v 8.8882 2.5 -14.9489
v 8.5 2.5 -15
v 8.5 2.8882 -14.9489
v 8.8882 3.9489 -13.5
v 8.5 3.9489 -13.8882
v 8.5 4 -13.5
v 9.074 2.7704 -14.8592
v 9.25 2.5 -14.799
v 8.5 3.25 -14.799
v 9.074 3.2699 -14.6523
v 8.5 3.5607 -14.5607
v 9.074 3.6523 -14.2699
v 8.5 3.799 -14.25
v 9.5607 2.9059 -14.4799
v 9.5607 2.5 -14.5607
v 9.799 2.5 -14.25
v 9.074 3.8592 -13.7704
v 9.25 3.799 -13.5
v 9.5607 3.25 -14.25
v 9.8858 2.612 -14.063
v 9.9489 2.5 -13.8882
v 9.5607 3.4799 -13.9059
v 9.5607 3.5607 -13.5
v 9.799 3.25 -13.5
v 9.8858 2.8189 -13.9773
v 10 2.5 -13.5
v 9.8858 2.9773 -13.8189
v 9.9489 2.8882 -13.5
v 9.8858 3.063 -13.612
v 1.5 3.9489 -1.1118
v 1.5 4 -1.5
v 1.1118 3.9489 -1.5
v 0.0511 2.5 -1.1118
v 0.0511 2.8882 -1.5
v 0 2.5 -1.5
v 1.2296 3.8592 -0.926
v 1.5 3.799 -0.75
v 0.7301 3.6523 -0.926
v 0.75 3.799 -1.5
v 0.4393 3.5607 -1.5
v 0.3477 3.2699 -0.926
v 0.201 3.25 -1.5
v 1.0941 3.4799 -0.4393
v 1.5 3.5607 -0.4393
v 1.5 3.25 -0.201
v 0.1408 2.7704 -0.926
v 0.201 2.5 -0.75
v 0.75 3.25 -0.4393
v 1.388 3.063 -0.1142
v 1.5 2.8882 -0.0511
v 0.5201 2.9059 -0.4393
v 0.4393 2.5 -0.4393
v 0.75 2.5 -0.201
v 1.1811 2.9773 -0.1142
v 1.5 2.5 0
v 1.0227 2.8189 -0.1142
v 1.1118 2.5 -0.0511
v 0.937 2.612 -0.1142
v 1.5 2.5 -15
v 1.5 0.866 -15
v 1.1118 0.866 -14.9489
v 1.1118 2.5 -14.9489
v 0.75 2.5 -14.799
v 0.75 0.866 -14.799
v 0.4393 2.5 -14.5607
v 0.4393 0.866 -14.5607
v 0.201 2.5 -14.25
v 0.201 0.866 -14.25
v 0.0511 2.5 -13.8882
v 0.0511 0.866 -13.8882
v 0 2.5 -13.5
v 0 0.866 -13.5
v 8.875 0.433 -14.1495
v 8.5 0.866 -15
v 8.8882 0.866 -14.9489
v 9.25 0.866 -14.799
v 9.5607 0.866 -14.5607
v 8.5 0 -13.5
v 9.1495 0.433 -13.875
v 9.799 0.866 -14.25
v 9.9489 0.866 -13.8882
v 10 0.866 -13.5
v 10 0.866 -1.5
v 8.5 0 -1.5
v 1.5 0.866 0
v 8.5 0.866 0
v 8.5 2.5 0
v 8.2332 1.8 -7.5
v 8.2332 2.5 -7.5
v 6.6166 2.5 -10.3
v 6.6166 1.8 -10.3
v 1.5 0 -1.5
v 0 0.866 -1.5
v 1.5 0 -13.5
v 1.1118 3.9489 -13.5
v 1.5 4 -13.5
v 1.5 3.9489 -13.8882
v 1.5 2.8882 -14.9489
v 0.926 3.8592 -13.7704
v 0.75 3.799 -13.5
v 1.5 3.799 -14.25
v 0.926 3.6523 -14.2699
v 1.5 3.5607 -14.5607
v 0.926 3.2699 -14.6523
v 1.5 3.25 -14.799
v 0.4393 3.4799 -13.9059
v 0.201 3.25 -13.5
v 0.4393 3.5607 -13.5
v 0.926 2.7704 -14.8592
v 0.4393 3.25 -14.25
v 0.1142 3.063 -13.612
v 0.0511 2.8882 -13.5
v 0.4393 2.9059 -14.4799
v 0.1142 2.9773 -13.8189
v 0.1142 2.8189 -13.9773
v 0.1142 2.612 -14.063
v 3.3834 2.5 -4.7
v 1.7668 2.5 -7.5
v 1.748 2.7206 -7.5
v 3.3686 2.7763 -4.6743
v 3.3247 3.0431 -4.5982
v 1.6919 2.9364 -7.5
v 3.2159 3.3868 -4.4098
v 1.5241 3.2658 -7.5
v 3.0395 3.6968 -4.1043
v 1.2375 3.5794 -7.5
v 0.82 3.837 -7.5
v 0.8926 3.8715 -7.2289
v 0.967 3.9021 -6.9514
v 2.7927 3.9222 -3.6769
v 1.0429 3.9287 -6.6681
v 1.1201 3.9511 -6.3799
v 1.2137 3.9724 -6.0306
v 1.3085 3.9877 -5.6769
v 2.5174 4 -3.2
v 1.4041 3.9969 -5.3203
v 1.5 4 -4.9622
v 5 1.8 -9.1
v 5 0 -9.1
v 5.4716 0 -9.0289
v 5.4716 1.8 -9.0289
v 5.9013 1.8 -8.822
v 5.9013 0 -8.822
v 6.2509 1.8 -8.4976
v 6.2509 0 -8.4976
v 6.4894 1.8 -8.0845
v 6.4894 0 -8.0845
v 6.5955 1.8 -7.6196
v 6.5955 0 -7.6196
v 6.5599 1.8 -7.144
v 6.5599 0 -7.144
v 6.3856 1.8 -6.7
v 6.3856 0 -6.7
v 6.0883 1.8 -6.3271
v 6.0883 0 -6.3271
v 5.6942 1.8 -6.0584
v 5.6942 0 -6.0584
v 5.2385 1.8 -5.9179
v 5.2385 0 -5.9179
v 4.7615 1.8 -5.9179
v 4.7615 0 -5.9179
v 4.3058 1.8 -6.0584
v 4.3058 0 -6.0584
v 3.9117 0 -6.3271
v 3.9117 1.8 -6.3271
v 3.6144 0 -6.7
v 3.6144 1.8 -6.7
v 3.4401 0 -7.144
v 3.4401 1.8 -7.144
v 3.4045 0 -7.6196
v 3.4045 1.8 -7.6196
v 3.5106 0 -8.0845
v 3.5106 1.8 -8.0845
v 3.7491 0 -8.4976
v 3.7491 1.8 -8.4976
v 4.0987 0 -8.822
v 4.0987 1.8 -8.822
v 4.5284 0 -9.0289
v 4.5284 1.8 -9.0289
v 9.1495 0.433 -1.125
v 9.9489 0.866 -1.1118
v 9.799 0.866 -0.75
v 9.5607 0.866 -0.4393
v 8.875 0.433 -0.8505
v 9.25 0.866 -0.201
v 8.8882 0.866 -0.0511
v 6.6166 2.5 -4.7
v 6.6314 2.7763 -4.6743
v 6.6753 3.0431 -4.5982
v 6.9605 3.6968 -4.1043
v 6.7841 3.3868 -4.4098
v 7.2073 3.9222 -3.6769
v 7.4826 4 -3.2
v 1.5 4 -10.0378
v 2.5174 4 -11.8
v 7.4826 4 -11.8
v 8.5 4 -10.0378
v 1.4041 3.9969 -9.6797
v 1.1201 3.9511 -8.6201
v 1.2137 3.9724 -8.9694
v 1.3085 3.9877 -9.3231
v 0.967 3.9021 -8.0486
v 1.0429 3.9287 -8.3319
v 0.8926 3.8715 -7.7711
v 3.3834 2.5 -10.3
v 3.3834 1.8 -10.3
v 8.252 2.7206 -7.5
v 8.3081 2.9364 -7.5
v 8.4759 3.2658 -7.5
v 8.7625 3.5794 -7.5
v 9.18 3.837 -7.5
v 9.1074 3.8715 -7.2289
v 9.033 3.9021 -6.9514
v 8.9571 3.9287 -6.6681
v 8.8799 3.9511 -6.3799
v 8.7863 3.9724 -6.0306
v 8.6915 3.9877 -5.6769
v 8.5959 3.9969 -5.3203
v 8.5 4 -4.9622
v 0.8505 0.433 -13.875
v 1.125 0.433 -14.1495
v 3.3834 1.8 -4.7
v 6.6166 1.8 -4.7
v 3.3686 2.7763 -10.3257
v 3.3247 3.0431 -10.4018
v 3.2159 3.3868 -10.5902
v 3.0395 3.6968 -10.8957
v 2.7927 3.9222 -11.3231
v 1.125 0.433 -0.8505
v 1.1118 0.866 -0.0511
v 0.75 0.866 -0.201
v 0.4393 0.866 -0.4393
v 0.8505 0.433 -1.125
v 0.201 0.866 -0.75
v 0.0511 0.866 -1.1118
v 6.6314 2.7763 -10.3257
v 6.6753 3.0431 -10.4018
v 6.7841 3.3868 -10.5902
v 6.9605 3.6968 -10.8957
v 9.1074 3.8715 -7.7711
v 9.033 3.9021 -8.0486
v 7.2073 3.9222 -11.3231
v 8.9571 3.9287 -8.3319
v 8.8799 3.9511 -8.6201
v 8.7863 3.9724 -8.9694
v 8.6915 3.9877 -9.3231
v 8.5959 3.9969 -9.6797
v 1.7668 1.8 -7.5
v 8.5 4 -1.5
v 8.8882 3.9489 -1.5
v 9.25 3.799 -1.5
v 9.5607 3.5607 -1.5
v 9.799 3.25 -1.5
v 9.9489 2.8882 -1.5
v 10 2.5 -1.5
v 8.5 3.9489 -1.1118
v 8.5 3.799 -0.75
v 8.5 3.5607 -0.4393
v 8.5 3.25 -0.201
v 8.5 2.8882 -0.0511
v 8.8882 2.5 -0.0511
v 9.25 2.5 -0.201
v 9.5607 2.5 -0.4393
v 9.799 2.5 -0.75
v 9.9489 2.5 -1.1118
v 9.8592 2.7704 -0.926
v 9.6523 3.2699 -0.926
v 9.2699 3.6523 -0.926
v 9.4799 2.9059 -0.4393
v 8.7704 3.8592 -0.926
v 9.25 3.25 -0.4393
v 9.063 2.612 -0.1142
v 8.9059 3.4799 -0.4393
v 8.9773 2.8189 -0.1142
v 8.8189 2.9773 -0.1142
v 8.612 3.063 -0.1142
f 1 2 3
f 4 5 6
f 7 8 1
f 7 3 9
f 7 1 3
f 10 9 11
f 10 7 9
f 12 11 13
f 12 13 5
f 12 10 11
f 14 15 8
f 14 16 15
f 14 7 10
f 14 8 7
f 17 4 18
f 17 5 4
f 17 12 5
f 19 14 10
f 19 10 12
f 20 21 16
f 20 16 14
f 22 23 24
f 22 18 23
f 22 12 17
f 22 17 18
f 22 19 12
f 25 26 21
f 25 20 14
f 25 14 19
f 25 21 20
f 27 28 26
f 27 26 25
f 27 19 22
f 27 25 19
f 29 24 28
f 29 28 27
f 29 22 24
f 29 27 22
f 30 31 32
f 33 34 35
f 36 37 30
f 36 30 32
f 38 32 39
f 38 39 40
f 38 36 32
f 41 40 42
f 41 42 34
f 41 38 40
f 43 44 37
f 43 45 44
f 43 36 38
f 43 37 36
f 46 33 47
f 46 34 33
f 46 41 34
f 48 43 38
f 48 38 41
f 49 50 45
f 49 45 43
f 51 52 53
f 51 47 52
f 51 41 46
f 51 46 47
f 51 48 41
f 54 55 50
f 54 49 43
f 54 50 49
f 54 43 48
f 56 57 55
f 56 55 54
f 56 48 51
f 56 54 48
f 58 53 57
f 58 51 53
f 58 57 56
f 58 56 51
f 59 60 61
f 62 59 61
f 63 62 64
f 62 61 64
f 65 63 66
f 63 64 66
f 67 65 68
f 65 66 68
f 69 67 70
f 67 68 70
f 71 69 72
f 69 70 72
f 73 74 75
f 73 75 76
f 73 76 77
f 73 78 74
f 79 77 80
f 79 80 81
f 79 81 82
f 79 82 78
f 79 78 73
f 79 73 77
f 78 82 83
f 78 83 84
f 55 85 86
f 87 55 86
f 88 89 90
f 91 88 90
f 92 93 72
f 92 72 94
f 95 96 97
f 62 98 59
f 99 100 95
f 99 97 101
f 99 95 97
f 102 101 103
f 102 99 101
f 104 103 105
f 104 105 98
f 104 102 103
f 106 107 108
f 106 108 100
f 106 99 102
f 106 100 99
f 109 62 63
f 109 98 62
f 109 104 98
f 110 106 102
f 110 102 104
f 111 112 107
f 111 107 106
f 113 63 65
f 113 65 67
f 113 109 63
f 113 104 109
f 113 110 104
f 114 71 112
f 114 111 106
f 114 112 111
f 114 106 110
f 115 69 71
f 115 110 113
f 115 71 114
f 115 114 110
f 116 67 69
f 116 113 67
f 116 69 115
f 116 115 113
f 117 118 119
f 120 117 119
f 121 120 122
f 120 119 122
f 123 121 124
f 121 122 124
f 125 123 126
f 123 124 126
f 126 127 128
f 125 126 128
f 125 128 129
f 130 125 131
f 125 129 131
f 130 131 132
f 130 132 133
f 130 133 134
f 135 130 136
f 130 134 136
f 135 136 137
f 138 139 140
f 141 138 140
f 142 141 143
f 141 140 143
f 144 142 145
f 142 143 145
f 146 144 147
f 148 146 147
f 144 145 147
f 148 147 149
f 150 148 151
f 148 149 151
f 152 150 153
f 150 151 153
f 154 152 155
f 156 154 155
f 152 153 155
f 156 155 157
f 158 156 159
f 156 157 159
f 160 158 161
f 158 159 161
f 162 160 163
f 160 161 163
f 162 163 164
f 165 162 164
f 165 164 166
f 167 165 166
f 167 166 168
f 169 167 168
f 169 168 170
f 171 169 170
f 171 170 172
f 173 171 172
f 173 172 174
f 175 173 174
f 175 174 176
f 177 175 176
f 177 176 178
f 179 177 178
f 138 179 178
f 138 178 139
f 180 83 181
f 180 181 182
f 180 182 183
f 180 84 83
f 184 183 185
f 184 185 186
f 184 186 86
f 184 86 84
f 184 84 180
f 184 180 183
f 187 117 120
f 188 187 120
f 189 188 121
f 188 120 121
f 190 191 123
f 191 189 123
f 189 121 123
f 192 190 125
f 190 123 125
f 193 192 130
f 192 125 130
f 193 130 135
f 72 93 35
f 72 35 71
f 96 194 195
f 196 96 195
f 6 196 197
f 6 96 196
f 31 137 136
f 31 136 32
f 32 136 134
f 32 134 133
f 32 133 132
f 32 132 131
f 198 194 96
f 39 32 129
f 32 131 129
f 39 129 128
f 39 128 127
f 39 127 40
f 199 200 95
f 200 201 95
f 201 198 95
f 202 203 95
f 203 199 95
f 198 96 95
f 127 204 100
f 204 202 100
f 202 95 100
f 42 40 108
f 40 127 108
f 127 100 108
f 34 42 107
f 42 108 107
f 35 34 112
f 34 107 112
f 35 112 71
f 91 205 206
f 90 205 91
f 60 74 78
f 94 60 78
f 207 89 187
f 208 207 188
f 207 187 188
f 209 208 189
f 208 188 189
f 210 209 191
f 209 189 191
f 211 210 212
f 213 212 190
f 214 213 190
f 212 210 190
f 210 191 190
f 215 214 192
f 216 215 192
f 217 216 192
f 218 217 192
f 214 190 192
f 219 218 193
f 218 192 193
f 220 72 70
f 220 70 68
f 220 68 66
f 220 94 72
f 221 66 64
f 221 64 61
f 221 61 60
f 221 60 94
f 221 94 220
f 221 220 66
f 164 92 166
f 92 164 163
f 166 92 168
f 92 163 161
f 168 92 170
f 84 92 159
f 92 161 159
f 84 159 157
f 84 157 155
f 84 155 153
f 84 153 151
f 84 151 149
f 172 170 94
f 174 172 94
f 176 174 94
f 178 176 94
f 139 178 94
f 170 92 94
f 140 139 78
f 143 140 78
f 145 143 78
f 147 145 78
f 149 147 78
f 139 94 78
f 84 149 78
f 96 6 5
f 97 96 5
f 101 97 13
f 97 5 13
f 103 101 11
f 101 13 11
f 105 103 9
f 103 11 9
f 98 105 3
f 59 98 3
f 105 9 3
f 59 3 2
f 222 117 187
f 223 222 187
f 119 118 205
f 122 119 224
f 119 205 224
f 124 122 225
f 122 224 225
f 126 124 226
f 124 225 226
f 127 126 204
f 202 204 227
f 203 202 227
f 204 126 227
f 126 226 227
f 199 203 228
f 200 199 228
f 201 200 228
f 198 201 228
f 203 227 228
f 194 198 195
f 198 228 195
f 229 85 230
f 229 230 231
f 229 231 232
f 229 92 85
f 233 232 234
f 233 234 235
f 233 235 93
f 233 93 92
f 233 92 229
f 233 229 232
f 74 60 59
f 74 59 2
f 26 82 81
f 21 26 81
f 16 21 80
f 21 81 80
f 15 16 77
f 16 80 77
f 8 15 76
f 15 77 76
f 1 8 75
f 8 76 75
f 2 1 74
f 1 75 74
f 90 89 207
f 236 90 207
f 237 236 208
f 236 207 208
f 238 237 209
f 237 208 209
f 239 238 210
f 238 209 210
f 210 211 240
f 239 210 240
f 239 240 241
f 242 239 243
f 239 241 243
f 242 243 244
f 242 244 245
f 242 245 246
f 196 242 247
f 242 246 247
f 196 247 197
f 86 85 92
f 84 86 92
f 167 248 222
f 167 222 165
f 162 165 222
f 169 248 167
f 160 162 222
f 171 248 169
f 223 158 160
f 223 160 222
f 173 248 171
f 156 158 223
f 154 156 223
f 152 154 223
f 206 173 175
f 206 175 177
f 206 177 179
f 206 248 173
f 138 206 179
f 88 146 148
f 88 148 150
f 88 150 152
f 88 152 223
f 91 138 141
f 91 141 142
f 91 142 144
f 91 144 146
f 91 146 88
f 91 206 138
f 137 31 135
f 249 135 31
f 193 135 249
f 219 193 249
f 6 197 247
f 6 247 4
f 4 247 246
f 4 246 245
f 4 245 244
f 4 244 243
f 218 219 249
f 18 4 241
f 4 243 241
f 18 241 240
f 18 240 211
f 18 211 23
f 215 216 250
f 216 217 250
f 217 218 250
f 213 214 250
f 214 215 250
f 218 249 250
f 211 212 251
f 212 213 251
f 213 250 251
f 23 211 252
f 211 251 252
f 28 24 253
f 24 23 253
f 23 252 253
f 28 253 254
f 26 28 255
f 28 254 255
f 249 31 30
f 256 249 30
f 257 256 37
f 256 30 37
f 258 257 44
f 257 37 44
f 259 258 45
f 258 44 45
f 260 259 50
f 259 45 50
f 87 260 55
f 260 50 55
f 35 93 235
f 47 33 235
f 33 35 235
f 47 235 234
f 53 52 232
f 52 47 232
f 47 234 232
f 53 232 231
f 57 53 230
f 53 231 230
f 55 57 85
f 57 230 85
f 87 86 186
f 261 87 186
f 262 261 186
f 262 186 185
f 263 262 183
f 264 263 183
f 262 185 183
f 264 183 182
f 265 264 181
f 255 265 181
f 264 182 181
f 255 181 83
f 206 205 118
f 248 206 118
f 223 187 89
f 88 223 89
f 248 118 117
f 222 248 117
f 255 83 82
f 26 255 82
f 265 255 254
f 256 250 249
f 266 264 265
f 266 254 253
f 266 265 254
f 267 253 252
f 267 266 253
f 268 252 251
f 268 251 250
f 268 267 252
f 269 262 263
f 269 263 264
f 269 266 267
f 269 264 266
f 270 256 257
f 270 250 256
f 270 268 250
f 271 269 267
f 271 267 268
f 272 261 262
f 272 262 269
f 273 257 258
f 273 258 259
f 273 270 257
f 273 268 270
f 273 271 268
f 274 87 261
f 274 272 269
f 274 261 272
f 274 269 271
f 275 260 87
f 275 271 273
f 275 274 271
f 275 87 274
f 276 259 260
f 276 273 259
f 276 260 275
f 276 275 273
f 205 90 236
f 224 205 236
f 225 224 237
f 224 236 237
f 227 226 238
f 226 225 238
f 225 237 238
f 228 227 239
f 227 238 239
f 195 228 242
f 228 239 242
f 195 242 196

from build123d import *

# Parameters (mm, degrees)
SKETCH1_W            = 10
SKETCH1_H            = 15
BOSS_EXTRUDE1_DEPTH  = 4
CUT_EXTRUDE1_DEPTH   = 2.2
M3_CLEARANCE_HOLE1_D = 3.2
FILLET1_R            = 1.5
CHAMFER1_SIZE        = 0.866025404
CHAMFER1_SIZE_2      = 1.5


with BuildPart() as part:
    # Sketch1 → Boss-Extrude1 (new body)
    with BuildSketch(Plane(origin=(0, 0, 0), x_dir=(1, 0, 0), z_dir=(0, 1, 0))):
        with Locations((5, 7.5)):
            Rectangle(SKETCH1_W, SKETCH1_H)
    extrude(amount=BOSS_EXTRUDE1_DEPTH)

    # Sketch2 → Cut-Extrude1 (cut)
    with BuildSketch(Plane(origin=(0, 4, 0), x_dir=(1, 0, 0), z_dir=(0, 1, 0))):
        Polygon((8.233161507, 7.5), (6.616580754, 10.3), (3.383419246, 10.3), (1.766838493, 7.5), (3.383419246, 4.7), (6.616580754, 4.7), align=None)
    extrude(amount=-CUT_EXTRUDE1_DEPTH, mode=Mode.SUBTRACT)

    # M3 Clearance Hole1 (through all)
    with Locations(Plane(origin=(5, 1.8, -7.5), x_dir=(0, 0, 1), z_dir=(0, 1, 0))):
        with Locations((0, 0)):
            Hole(M3_CLEARANCE_HOLE1_D / 2)

    # Fillet1
    # the kernel refuses this fillet: 1.5 mm, written as the material it takes off along each edge
    with BuildSketch(Plane(origin=(8.5, 2.5, -1.5), x_dir=(1, 0, 0), z_dir=(0, 0, 1))) as fillet1_piece_1_section:
        Polygon((0, 0), (FILLET1_R, 0), (FILLET1_R, FILLET1_R), (0, FILLET1_R), align=None)
    fillet1_piece_1 = extrude(amount=FILLET1_R, mode=Mode.PRIVATE)
    fillet1_piece_1 = fillet1_piece_1 - Plane(origin=(8.5, 2.5, -1.5), x_dir=(-0.7071067811865475, -0.7071067811865475, 0), z_dir=(0, 0, 1)) * Sphere(FILLET1_R, mode=Mode.PRIVATE)
    add(fillet1_piece_1, mode=Mode.SUBTRACT)
    with BuildSketch(Plane(origin=(8.5, 2.5, -13.5), x_dir=(0, 1, 0), z_dir=(1, 0, 0))) as fillet1_piece_2_section:
        Polygon((0, 0), (FILLET1_R, 0), (FILLET1_R, -FILLET1_R), (0, -FILLET1_R), align=None)
    fillet1_piece_2 = extrude(amount=FILLET1_R, mode=Mode.PRIVATE)
    fillet1_piece_2 = fillet1_piece_2 - Plane(origin=(8.5, 2.5, -13.5), x_dir=(0, -0.7071067811865475, 0.7071067811865475), z_dir=(1, 0, 0)) * Sphere(FILLET1_R, mode=Mode.PRIVATE)
    add(fillet1_piece_2, mode=Mode.SUBTRACT)
    with BuildSketch(Plane(origin=(1.5, 2.5, -13.5), x_dir=(0, 1, 0), z_dir=(-1, 0, 0))) as fillet1_piece_3_section:
        Polygon((0, 0), (FILLET1_R, 0), (FILLET1_R, FILLET1_R), (0, FILLET1_R), align=None)
    fillet1_piece_3 = extrude(amount=FILLET1_R, mode=Mode.PRIVATE)
    fillet1_piece_3 = fillet1_piece_3 - Plane(origin=(1.5, 2.5, -13.5), x_dir=(0, -0.7071067811865475, 0.7071067811865475), z_dir=(-1, 0, 0)) * Sphere(FILLET1_R, mode=Mode.PRIVATE)
    add(fillet1_piece_3, mode=Mode.SUBTRACT)
    with BuildSketch(Plane(origin=(1.5, 2.5, -1.5), x_dir=(-1, 0, 0), z_dir=(0, 0, 1))) as fillet1_piece_4_section:
        Polygon((0, 0), (FILLET1_R, 0), (FILLET1_R, -FILLET1_R), (0, -FILLET1_R), align=None)
    fillet1_piece_4 = extrude(amount=FILLET1_R, mode=Mode.PRIVATE)
    fillet1_piece_4 = fillet1_piece_4 - Plane(origin=(1.5, 2.5, -1.5), x_dir=(0.7071067811865475, -0.7071067811865475, 0), z_dir=(0, 0, 1)) * Sphere(FILLET1_R, mode=Mode.PRIVATE)
    add(fillet1_piece_4, mode=Mode.SUBTRACT)
    with BuildSketch(Plane(origin=(10, 4, -1.5), x_dir=(0, -1, 0), z_dir=(0, 0, -1)), Plane(origin=(0, 4, -13.5), x_dir=(0, -1, 0), z_dir=(0, 0, 1))) as fillet1_piece_5:
        with BuildLine():
            CenterArc((FILLET1_R, FILLET1_R), FILLET1_R, 180, 90)
            Line((0, FILLET1_R), (0, 0))
            Line((0, 0), (FILLET1_R, 0))
        make_face()
    extrude(amount=12, mode=Mode.SUBTRACT)
    with BuildSketch(Plane(origin=(8.5, 4, -15), x_dir=(0, 0, 1), z_dir=(-1, 0, 0))) as fillet1_piece_6:
        with BuildLine():
            CenterArc((FILLET1_R, -FILLET1_R), FILLET1_R, 90, 90)
            Line((0, -FILLET1_R), (0, 0))
            Line((0, 0), (FILLET1_R, 0))
        make_face()
    extrude(amount=7, mode=Mode.SUBTRACT)
    with BuildSketch(Plane(origin=(4.741580754, 4, -1.452404736), x_dir=(0.866025403784439, 0, 0.49999999999999933), z_dir=(0.49999999999999933, 0, -0.866025403784439))) as fillet1_piece_7_section:
        with BuildLine():
            CenterArc((FILLET1_R, FILLET1_R), FILLET1_R, 180, 90)
            Line((0, FILLET1_R), (0, 0))
            Line((0, 0), (FILLET1_R, 0))
        make_face()
    fillet1_piece_7 = extrude(amount=10.733161507, mode=Mode.PRIVATE)
    fillet1_piece_7 = split(fillet1_piece_7, bisect_by=Plane(origin=(9.978951884, 4, -4.476202368), z_dir=(-0.8660254037844388, 0, 0.4999999999999998)), keep=Keep.TOP, mode=Mode.PRIVATE)
    fillet1_piece_7 = split(fillet1_piece_7, bisect_by=Plane(origin=(4.741580754, 4, -4.7), z_dir=(0, 0, -1)), keep=Keep.TOP, mode=Mode.PRIVATE)
    add(fillet1_piece_7, mode=Mode.SUBTRACT)
    with BuildSketch(Plane(origin=(10.108161507, 4, -4.252404736), x_dir=(0.8660254037844388, 0, -0.4999999999999998), z_dir=(-0.4999999999999998, 0, -0.8660254037844388))) as fillet1_piece_8_section:
        with BuildLine():
            CenterArc((FILLET1_R, FILLET1_R), FILLET1_R, 180, 90)
            Line((0, FILLET1_R), (0, 0))
            Line((0, 0), (FILLET1_R, 0))
        make_face()
    fillet1_piece_8 = extrude(amount=10.733161507, mode=Mode.PRIVATE)
    fillet1_piece_8 = split(fillet1_piece_8, bisect_by=Plane(origin=(7.295661507, 4, -5.876202368), z_dir=(-0.866025403784439, 0, -0.49999999999999933)), keep=Keep.TOP, mode=Mode.PRIVATE)
    fillet1_piece_8 = split(fillet1_piece_8, bisect_by=Plane(origin=(10.108161507, 4, -10.3), z_dir=(0, 0, 1)), keep=Keep.TOP, mode=Mode.PRIVATE)
    add(fillet1_piece_8, mode=Mode.SUBTRACT)
    with BuildSketch(Plane(origin=(10.366580754, 4, -10.3), x_dir=(0, 0, -1), z_dir=(-1, 0, 0))) as fillet1_piece_9_section:
        with BuildLine():
            CenterArc((FILLET1_R, FILLET1_R), FILLET1_R, 180, 90)
            Line((0, FILLET1_R), (0, 0))
            Line((0, 0), (FILLET1_R, 0))
        make_face()
    fillet1_piece_9 = extrude(amount=10.733161507, mode=Mode.PRIVATE)
    fillet1_piece_9 = split(fillet1_piece_9, bisect_by=Plane(origin=(7.554080754, 4, -8.676202368), z_dir=(-0.8660254037844388, 0, 0.4999999999999998)), keep=Keep.TOP, mode=Mode.PRIVATE)
    fillet1_piece_9 = split(fillet1_piece_9, bisect_by=Plane(origin=(5.129209623, 4, -13.323797632), z_dir=(0.8660254037844387, 0, 0.49999999999999994)), keep=Keep.TOP, mode=Mode.PRIVATE)
    add(fillet1_piece_9, mode=Mode.SUBTRACT)
    with BuildSketch(Plane(origin=(5.258419246, 4, -13.547595264), x_dir=(-0.8660254037844387, 0, -0.49999999999999994), z_dir=(-0.49999999999999994, 0, 0.8660254037844387))) as fillet1_piece_10_section:
        with BuildLine():
            CenterArc((FILLET1_R, FILLET1_R), FILLET1_R, 180, 90)
            Line((0, FILLET1_R), (0, 0))
            Line((0, 0), (FILLET1_R, 0))
        make_face()
    fillet1_piece_10 = extrude(amount=10.733161507, mode=Mode.PRIVATE)
    fillet1_piece_10 = split(fillet1_piece_10, bisect_by=Plane(origin=(5.258419246, 4, -10.3), z_dir=(0, 0, 1)), keep=Keep.TOP, mode=Mode.PRIVATE)
    fillet1_piece_10 = split(fillet1_piece_10, bisect_by=Plane(origin=(0.021048116, 4, -10.523797632), z_dir=(0.8660254037844386, 0, -0.5000000000000001)), keep=Keep.TOP, mode=Mode.PRIVATE)
    add(fillet1_piece_10, mode=Mode.SUBTRACT)
    with BuildSketch(Plane(origin=(-0.108161507, 4, -10.747595264), x_dir=(-0.8660254037844387, 0, 0.5000000000000001), z_dir=(0.5000000000000001, 0, 0.8660254037844386))) as fillet1_piece_11_section:
        with BuildLine():
            CenterArc((FILLET1_R, FILLET1_R), FILLET1_R, 180, 90)
            Line((0, FILLET1_R), (0, 0))
            Line((0, 0), (FILLET1_R, 0))
        make_face()
    fillet1_piece_11 = extrude(amount=10.733161507, mode=Mode.PRIVATE)
    fillet1_piece_11 = split(fillet1_piece_11, bisect_by=Plane(origin=(2.704338493, 4, -9.123797632), z_dir=(0.8660254037844387, 0, 0.49999999999999994)), keep=Keep.TOP, mode=Mode.PRIVATE)
    fillet1_piece_11 = split(fillet1_piece_11, bisect_by=Plane(origin=(-0.108161507, 4, -4.7), z_dir=(0, 0, -1)), keep=Keep.TOP, mode=Mode.PRIVATE)
    add(fillet1_piece_11, mode=Mode.SUBTRACT)
    with BuildSketch(Plane(origin=(-0.366580754, 4, -4.7), x_dir=(0, 0, 1), z_dir=(1, 0, 0))) as fillet1_piece_12_section:
        with BuildLine():
            CenterArc((FILLET1_R, FILLET1_R), FILLET1_R, 180, 90)
            Line((0, FILLET1_R), (0, 0))
            Line((0, 0), (FILLET1_R, 0))
        make_face()
    fillet1_piece_12 = extrude(amount=10.733161507, mode=Mode.PRIVATE)
    fillet1_piece_12 = split(fillet1_piece_12, bisect_by=Plane(origin=(2.445919246, 4, -6.323797632), z_dir=(0.8660254037844386, 0, -0.5000000000000001)), keep=Keep.TOP, mode=Mode.PRIVATE)
    fillet1_piece_12 = split(fillet1_piece_12, bisect_by=Plane(origin=(4.870790377, 4, -1.676202368), z_dir=(-0.866025403784439, 0, -0.49999999999999933)), keep=Keep.TOP, mode=Mode.PRIVATE)
    add(fillet1_piece_12, mode=Mode.SUBTRACT)
    with BuildSketch(Plane(origin=(0, -3.75, -15), x_dir=(0, 0, 1), z_dir=(0, 1, 0)), Plane(origin=(0, -3.75, 0), x_dir=(1, 0, 0), z_dir=(0, 1, 0))) as fillet1_piece_13:
        with BuildLine():
            CenterArc((FILLET1_R, FILLET1_R), FILLET1_R, 180, 90)
            Line((0, FILLET1_R), (0, 0))
            Line((0, 0), (FILLET1_R, 0))
        make_face()
    extrude(amount=6.25, mode=Mode.SUBTRACT)
    with BuildSketch(Plane(origin=(10, -3.75, -15), x_dir=(0, 0, 1), z_dir=(0, 1, 0)), Plane(origin=(10, -3.75, 0), x_dir=(-1, 0, 0), z_dir=(0, 1, 0))) as fillet1_piece_14:
        with BuildLine():
            CenterArc((FILLET1_R, -FILLET1_R), FILLET1_R, 90, 90)
            Line((0, -FILLET1_R), (0, 0))
            Line((0, 0), (FILLET1_R, 0))
        make_face()
    extrude(amount=6.25, mode=Mode.SUBTRACT)
    with BuildSketch(Plane(origin=(1.5, 4, 0), x_dir=(0, -1, 0), z_dir=(1, 0, 0))) as fillet1_piece_15:
        with BuildLine():
            CenterArc((FILLET1_R, FILLET1_R), FILLET1_R, 180, 90)
            Line((0, FILLET1_R), (0, 0))
            Line((0, 0), (FILLET1_R, 0))
        make_face()
    extrude(amount=7, mode=Mode.SUBTRACT)
    with BuildSketch(Plane(origin=(-0.366580754, 4, -4.7), x_dir=(0, 0, 1), z_dir=(1, 0, 0))) as fillet1_piece_16a_section:
        with BuildLine():
            CenterArc((FILLET1_R, FILLET1_R), FILLET1_R, 180, 90)
            Line((0, FILLET1_R), (0, 0))
            Line((0, 0), (FILLET1_R, 0))
        make_face()
    fillet1_piece_16a = extrude(amount=10.733161507, mode=Mode.PRIVATE)
    fillet1_piece_16a = split(fillet1_piece_16a, bisect_by=Plane(origin=(4.870790377, 4, -1.676202368), z_dir=(0.866025403784439, 0, 0.49999999999999933)), keep=Keep.TOP, mode=Mode.PRIVATE)
    with BuildSketch(Plane(origin=(4.741580754, 4, -1.452404736), x_dir=(0.866025403784439, 0, 0.49999999999999933), z_dir=(0.49999999999999933, 0, -0.866025403784439))) as fillet1_piece_16b_section:
        with BuildLine():
            CenterArc((FILLET1_R, FILLET1_R), FILLET1_R, 180, 90)
            Line((0, FILLET1_R), (0, 0))
            Line((0, 0), (FILLET1_R, 0))
        make_face()
    fillet1_piece_16b = extrude(amount=10.733161507, mode=Mode.PRIVATE)
    fillet1_piece_16b = split(fillet1_piece_16b, bisect_by=Plane(origin=(4.741580754, 4, -4.7), z_dir=(0, 0, 1)), keep=Keep.TOP, mode=Mode.PRIVATE)
    fillet1_piece_16 = fillet1_piece_16a & fillet1_piece_16b
    add(fillet1_piece_16, mode=Mode.SUBTRACT)
    with BuildSketch(Plane(origin=(10.108161507, 4, -4.252404736), x_dir=(0.8660254037844388, 0, -0.4999999999999998), z_dir=(-0.4999999999999998, 0, -0.8660254037844388))) as fillet1_piece_17a_section:
        with BuildLine():
            CenterArc((FILLET1_R, FILLET1_R), FILLET1_R, 180, 90)
            Line((0, FILLET1_R), (0, 0))
            Line((0, 0), (FILLET1_R, 0))
        make_face()
    fillet1_piece_17a = extrude(amount=10.733161507, mode=Mode.PRIVATE)
    fillet1_piece_17a = split(fillet1_piece_17a, bisect_by=Plane(origin=(7.295661507, 4, -5.876202368), z_dir=(0.866025403784439, 0, 0.49999999999999933)), keep=Keep.TOP, mode=Mode.PRIVATE)
    with BuildSketch(Plane(origin=(4.741580754, 4, -1.452404736), x_dir=(0.866025403784439, 0, 0.49999999999999933), z_dir=(0.49999999999999933, 0, -0.866025403784439))) as fillet1_piece_17b_section:
        with BuildLine():
            CenterArc((FILLET1_R, FILLET1_R), FILLET1_R, 180, 90)
            Line((0, FILLET1_R), (0, 0))
            Line((0, 0), (FILLET1_R, 0))
        make_face()
    fillet1_piece_17b = extrude(amount=10.733161507, mode=Mode.PRIVATE)
    fillet1_piece_17b = split(fillet1_piece_17b, bisect_by=Plane(origin=(9.978951884, 4, -4.476202368), z_dir=(0.8660254037844388, 0, -0.4999999999999998)), keep=Keep.TOP, mode=Mode.PRIVATE)
    fillet1_piece_17 = fillet1_piece_17a & fillet1_piece_17b
    add(fillet1_piece_17, mode=Mode.SUBTRACT)
    with BuildSketch(Plane(origin=(10.108161507, 4, -4.252404736), x_dir=(0.8660254037844388, 0, -0.4999999999999998), z_dir=(-0.4999999999999998, 0, -0.8660254037844388))) as fillet1_piece_18a_section:
        with BuildLine():
            CenterArc((FILLET1_R, FILLET1_R), FILLET1_R, 180, 90)
            Line((0, FILLET1_R), (0, 0))
            Line((0, 0), (FILLET1_R, 0))
        make_face()
    fillet1_piece_18a = extrude(amount=10.733161507, mode=Mode.PRIVATE)
    fillet1_piece_18a = split(fillet1_piece_18a, bisect_by=Plane(origin=(10.108161507, 4, -10.3), z_dir=(0, 0, -1)), keep=Keep.TOP, mode=Mode.PRIVATE)
    with BuildSketch(Plane(origin=(10.366580754, 4, -10.3), x_dir=(0, 0, -1), z_dir=(-1, 0, 0))) as fillet1_piece_18b_section:
        with BuildLine():
            CenterArc((FILLET1_R, FILLET1_R), FILLET1_R, 180, 90)
            Line((0, FILLET1_R), (0, 0))
            Line((0, 0), (FILLET1_R, 0))
        make_face()
    fillet1_piece_18b = extrude(amount=10.733161507, mode=Mode.PRIVATE)
    fillet1_piece_18b = split(fillet1_piece_18b, bisect_by=Plane(origin=(7.554080754, 4, -8.676202368), z_dir=(0.8660254037844388, 0, -0.4999999999999998)), keep=Keep.TOP, mode=Mode.PRIVATE)
    fillet1_piece_18 = fillet1_piece_18a & fillet1_piece_18b
    add(fillet1_piece_18, mode=Mode.SUBTRACT)
    with BuildSketch(Plane(origin=(10.366580754, 4, -10.3), x_dir=(0, 0, -1), z_dir=(-1, 0, 0))) as fillet1_piece_19a_section:
        with BuildLine():
            CenterArc((FILLET1_R, FILLET1_R), FILLET1_R, 180, 90)
            Line((0, FILLET1_R), (0, 0))
            Line((0, 0), (FILLET1_R, 0))
        make_face()
    fillet1_piece_19a = extrude(amount=10.733161507, mode=Mode.PRIVATE)
    fillet1_piece_19a = split(fillet1_piece_19a, bisect_by=Plane(origin=(5.129209623, 4, -13.323797632), z_dir=(-0.8660254037844387, 0, -0.49999999999999994)), keep=Keep.TOP, mode=Mode.PRIVATE)
    with BuildSketch(Plane(origin=(5.258419246, 4, -13.547595264), x_dir=(-0.8660254037844387, 0, -0.49999999999999994), z_dir=(-0.49999999999999994, 0, 0.8660254037844387))) as fillet1_piece_19b_section:
        with BuildLine():
            CenterArc((FILLET1_R, FILLET1_R), FILLET1_R, 180, 90)
            Line((0, FILLET1_R), (0, 0))
            Line((0, 0), (FILLET1_R, 0))
        make_face()
    fillet1_piece_19b = extrude(amount=10.733161507, mode=Mode.PRIVATE)
    fillet1_piece_19b = split(fillet1_piece_19b, bisect_by=Plane(origin=(5.258419246, 4, -10.3), z_dir=(0, 0, -1)), keep=Keep.TOP, mode=Mode.PRIVATE)
    fillet1_piece_19 = fillet1_piece_19a & fillet1_piece_19b
    add(fillet1_piece_19, mode=Mode.SUBTRACT)
    with BuildSketch(Plane(origin=(5.258419246, 4, -13.547595264), x_dir=(-0.8660254037844387, 0, -0.49999999999999994), z_dir=(-0.49999999999999994, 0, 0.8660254037844387))) as fillet1_piece_20a_section:
        with BuildLine():
            CenterArc((FILLET1_R, FILLET1_R), FILLET1_R, 180, 90)
            Line((0, FILLET1_R), (0, 0))
            Line((0, 0), (FILLET1_R, 0))
        make_face()
    fillet1_piece_20a = extrude(amount=10.733161507, mode=Mode.PRIVATE)
    fillet1_piece_20a = split(fillet1_piece_20a, bisect_by=Plane(origin=(0.021048116, 4, -10.523797632), z_dir=(-0.8660254037844386, 0, 0.5000000000000001)), keep=Keep.TOP, mode=Mode.PRIVATE)
    with BuildSketch(Plane(origin=(-0.108161507, 4, -10.747595264), x_dir=(-0.8660254037844387, 0, 0.5000000000000001), z_dir=(0.5000000000000001, 0, 0.8660254037844386))) as fillet1_piece_20b_section:
        with BuildLine():
            CenterArc((FILLET1_R, FILLET1_R), FILLET1_R, 180, 90)
            Line((0, FILLET1_R), (0, 0))
            Line((0, 0), (FILLET1_R, 0))
        make_face()
    fillet1_piece_20b = extrude(amount=10.733161507, mode=Mode.PRIVATE)
    fillet1_piece_20b = split(fillet1_piece_20b, bisect_by=Plane(origin=(2.704338493, 4, -9.123797632), z_dir=(-0.8660254037844387, 0, -0.49999999999999994)), keep=Keep.TOP, mode=Mode.PRIVATE)
    fillet1_piece_20 = fillet1_piece_20a & fillet1_piece_20b
    add(fillet1_piece_20, mode=Mode.SUBTRACT)
    with BuildSketch(Plane(origin=(-0.108161507, 4, -10.747595264), x_dir=(-0.8660254037844387, 0, 0.5000000000000001), z_dir=(0.5000000000000001, 0, 0.8660254037844386))) as fillet1_piece_21a_section:
        with BuildLine():
            CenterArc((FILLET1_R, FILLET1_R), FILLET1_R, 180, 90)
            Line((0, FILLET1_R), (0, 0))
            Line((0, 0), (FILLET1_R, 0))
        make_face()
    fillet1_piece_21a = extrude(amount=10.733161507, mode=Mode.PRIVATE)
    fillet1_piece_21a = split(fillet1_piece_21a, bisect_by=Plane(origin=(-0.108161507, 4, -4.7), z_dir=(0, 0, 1)), keep=Keep.TOP, mode=Mode.PRIVATE)
    with BuildSketch(Plane(origin=(-0.366580754, 4, -4.7), x_dir=(0, 0, 1), z_dir=(1, 0, 0))) as fillet1_piece_21b_section:
        with BuildLine():
            CenterArc((FILLET1_R, FILLET1_R), FILLET1_R, 180, 90)
            Line((0, FILLET1_R), (0, 0))
            Line((0, 0), (FILLET1_R, 0))
        make_face()
    fillet1_piece_21b = extrude(amount=10.733161507, mode=Mode.PRIVATE)
    fillet1_piece_21b = split(fillet1_piece_21b, bisect_by=Plane(origin=(2.445919246, 4, -6.323797632), z_dir=(-0.8660254037844386, 0, 0.5000000000000001)), keep=Keep.TOP, mode=Mode.PRIVATE)
    fillet1_piece_21 = fillet1_piece_21a & fillet1_piece_21b
    add(fillet1_piece_21, mode=Mode.SUBTRACT)

    # Chamfer1
    # the kernel refuses this chamfer: 1.5, 0.866025404 mm, written as the material it takes off along each edge
    with BuildSketch(Plane(origin=(8.5, 0, -15), x_dir=(0, 1, 0), z_dir=(-1, 0, 0)), Plane(origin=(1.5, 0, 0), x_dir=(0, 1, 0), z_dir=(1, 0, 0))) as chamfer1_piece_1:
        Polygon((CHAMFER1_SIZE, 0), (0, -CHAMFER1_SIZE_2), (0, 0), align=None)
    extrude(amount=7, mode=Mode.SUBTRACT)
    with BuildSketch(Plane(origin=(10, 0, -1.5), x_dir=(0, 1, 0), z_dir=(0, 0, -1)), Plane(origin=(0, 0, -13.5), x_dir=(0, 1, 0), z_dir=(0, 0, 1))) as chamfer1_piece_2:
        Polygon((CHAMFER1_SIZE, 0), (0, -CHAMFER1_SIZE_2), (0, 0), align=None)
    extrude(amount=12, mode=Mode.SUBTRACT)
    with BuildSketch(Plane(origin=(8.5, 0, -13.5), x_dir=(0, 0, -1), z_dir=(-1, 0, 0))) as chamfer1_piece_3:
        Polygon((1.5, -CHAMFER1_SIZE), (1.5 - CHAMFER1_SIZE_2, 0), (1.5, 0), align=None)
    revolve(axis=Axis((8.5, 0, -13.5), (0, -1, 0)), revolution_arc=90, mode=Mode.SUBTRACT)
    with BuildSketch(Plane(origin=(1.5, 0, -13.5), x_dir=(-1, 0, 0), z_dir=(0, 0, 1))) as chamfer1_piece_4:
        Polygon((1.5, -CHAMFER1_SIZE), (1.5 - CHAMFER1_SIZE_2, 0), (1.5, 0), align=None)
    revolve(axis=Axis((1.5, 0, -13.5), (0, -1, 0)), revolution_arc=90, mode=Mode.SUBTRACT)
    with BuildSketch(Plane(origin=(1.5, 0, -1.5), x_dir=(0, 0, 1), z_dir=(1, 0, 0))) as chamfer1_piece_5:
        Polygon((1.5, -CHAMFER1_SIZE), (1.5 - CHAMFER1_SIZE_2, 0), (1.5, 0), align=None)
    revolve(axis=Axis((1.5, 0, -1.5), (0, -1, 0)), revolution_arc=90, mode=Mode.SUBTRACT)
    with BuildSketch(Plane(origin=(8.5, 0, -1.5), x_dir=(1, 0, 0), z_dir=(0, 0, -1))) as chamfer1_piece_6:
        Polygon((1.5, -CHAMFER1_SIZE), (1.5 - CHAMFER1_SIZE_2, 0), (1.5, 0), align=None)
    revolve(axis=Axis((8.5, 0, -1.5), (0, -1, 0)), revolution_arc=90, mode=Mode.SUBTRACT)


solid = part.part
